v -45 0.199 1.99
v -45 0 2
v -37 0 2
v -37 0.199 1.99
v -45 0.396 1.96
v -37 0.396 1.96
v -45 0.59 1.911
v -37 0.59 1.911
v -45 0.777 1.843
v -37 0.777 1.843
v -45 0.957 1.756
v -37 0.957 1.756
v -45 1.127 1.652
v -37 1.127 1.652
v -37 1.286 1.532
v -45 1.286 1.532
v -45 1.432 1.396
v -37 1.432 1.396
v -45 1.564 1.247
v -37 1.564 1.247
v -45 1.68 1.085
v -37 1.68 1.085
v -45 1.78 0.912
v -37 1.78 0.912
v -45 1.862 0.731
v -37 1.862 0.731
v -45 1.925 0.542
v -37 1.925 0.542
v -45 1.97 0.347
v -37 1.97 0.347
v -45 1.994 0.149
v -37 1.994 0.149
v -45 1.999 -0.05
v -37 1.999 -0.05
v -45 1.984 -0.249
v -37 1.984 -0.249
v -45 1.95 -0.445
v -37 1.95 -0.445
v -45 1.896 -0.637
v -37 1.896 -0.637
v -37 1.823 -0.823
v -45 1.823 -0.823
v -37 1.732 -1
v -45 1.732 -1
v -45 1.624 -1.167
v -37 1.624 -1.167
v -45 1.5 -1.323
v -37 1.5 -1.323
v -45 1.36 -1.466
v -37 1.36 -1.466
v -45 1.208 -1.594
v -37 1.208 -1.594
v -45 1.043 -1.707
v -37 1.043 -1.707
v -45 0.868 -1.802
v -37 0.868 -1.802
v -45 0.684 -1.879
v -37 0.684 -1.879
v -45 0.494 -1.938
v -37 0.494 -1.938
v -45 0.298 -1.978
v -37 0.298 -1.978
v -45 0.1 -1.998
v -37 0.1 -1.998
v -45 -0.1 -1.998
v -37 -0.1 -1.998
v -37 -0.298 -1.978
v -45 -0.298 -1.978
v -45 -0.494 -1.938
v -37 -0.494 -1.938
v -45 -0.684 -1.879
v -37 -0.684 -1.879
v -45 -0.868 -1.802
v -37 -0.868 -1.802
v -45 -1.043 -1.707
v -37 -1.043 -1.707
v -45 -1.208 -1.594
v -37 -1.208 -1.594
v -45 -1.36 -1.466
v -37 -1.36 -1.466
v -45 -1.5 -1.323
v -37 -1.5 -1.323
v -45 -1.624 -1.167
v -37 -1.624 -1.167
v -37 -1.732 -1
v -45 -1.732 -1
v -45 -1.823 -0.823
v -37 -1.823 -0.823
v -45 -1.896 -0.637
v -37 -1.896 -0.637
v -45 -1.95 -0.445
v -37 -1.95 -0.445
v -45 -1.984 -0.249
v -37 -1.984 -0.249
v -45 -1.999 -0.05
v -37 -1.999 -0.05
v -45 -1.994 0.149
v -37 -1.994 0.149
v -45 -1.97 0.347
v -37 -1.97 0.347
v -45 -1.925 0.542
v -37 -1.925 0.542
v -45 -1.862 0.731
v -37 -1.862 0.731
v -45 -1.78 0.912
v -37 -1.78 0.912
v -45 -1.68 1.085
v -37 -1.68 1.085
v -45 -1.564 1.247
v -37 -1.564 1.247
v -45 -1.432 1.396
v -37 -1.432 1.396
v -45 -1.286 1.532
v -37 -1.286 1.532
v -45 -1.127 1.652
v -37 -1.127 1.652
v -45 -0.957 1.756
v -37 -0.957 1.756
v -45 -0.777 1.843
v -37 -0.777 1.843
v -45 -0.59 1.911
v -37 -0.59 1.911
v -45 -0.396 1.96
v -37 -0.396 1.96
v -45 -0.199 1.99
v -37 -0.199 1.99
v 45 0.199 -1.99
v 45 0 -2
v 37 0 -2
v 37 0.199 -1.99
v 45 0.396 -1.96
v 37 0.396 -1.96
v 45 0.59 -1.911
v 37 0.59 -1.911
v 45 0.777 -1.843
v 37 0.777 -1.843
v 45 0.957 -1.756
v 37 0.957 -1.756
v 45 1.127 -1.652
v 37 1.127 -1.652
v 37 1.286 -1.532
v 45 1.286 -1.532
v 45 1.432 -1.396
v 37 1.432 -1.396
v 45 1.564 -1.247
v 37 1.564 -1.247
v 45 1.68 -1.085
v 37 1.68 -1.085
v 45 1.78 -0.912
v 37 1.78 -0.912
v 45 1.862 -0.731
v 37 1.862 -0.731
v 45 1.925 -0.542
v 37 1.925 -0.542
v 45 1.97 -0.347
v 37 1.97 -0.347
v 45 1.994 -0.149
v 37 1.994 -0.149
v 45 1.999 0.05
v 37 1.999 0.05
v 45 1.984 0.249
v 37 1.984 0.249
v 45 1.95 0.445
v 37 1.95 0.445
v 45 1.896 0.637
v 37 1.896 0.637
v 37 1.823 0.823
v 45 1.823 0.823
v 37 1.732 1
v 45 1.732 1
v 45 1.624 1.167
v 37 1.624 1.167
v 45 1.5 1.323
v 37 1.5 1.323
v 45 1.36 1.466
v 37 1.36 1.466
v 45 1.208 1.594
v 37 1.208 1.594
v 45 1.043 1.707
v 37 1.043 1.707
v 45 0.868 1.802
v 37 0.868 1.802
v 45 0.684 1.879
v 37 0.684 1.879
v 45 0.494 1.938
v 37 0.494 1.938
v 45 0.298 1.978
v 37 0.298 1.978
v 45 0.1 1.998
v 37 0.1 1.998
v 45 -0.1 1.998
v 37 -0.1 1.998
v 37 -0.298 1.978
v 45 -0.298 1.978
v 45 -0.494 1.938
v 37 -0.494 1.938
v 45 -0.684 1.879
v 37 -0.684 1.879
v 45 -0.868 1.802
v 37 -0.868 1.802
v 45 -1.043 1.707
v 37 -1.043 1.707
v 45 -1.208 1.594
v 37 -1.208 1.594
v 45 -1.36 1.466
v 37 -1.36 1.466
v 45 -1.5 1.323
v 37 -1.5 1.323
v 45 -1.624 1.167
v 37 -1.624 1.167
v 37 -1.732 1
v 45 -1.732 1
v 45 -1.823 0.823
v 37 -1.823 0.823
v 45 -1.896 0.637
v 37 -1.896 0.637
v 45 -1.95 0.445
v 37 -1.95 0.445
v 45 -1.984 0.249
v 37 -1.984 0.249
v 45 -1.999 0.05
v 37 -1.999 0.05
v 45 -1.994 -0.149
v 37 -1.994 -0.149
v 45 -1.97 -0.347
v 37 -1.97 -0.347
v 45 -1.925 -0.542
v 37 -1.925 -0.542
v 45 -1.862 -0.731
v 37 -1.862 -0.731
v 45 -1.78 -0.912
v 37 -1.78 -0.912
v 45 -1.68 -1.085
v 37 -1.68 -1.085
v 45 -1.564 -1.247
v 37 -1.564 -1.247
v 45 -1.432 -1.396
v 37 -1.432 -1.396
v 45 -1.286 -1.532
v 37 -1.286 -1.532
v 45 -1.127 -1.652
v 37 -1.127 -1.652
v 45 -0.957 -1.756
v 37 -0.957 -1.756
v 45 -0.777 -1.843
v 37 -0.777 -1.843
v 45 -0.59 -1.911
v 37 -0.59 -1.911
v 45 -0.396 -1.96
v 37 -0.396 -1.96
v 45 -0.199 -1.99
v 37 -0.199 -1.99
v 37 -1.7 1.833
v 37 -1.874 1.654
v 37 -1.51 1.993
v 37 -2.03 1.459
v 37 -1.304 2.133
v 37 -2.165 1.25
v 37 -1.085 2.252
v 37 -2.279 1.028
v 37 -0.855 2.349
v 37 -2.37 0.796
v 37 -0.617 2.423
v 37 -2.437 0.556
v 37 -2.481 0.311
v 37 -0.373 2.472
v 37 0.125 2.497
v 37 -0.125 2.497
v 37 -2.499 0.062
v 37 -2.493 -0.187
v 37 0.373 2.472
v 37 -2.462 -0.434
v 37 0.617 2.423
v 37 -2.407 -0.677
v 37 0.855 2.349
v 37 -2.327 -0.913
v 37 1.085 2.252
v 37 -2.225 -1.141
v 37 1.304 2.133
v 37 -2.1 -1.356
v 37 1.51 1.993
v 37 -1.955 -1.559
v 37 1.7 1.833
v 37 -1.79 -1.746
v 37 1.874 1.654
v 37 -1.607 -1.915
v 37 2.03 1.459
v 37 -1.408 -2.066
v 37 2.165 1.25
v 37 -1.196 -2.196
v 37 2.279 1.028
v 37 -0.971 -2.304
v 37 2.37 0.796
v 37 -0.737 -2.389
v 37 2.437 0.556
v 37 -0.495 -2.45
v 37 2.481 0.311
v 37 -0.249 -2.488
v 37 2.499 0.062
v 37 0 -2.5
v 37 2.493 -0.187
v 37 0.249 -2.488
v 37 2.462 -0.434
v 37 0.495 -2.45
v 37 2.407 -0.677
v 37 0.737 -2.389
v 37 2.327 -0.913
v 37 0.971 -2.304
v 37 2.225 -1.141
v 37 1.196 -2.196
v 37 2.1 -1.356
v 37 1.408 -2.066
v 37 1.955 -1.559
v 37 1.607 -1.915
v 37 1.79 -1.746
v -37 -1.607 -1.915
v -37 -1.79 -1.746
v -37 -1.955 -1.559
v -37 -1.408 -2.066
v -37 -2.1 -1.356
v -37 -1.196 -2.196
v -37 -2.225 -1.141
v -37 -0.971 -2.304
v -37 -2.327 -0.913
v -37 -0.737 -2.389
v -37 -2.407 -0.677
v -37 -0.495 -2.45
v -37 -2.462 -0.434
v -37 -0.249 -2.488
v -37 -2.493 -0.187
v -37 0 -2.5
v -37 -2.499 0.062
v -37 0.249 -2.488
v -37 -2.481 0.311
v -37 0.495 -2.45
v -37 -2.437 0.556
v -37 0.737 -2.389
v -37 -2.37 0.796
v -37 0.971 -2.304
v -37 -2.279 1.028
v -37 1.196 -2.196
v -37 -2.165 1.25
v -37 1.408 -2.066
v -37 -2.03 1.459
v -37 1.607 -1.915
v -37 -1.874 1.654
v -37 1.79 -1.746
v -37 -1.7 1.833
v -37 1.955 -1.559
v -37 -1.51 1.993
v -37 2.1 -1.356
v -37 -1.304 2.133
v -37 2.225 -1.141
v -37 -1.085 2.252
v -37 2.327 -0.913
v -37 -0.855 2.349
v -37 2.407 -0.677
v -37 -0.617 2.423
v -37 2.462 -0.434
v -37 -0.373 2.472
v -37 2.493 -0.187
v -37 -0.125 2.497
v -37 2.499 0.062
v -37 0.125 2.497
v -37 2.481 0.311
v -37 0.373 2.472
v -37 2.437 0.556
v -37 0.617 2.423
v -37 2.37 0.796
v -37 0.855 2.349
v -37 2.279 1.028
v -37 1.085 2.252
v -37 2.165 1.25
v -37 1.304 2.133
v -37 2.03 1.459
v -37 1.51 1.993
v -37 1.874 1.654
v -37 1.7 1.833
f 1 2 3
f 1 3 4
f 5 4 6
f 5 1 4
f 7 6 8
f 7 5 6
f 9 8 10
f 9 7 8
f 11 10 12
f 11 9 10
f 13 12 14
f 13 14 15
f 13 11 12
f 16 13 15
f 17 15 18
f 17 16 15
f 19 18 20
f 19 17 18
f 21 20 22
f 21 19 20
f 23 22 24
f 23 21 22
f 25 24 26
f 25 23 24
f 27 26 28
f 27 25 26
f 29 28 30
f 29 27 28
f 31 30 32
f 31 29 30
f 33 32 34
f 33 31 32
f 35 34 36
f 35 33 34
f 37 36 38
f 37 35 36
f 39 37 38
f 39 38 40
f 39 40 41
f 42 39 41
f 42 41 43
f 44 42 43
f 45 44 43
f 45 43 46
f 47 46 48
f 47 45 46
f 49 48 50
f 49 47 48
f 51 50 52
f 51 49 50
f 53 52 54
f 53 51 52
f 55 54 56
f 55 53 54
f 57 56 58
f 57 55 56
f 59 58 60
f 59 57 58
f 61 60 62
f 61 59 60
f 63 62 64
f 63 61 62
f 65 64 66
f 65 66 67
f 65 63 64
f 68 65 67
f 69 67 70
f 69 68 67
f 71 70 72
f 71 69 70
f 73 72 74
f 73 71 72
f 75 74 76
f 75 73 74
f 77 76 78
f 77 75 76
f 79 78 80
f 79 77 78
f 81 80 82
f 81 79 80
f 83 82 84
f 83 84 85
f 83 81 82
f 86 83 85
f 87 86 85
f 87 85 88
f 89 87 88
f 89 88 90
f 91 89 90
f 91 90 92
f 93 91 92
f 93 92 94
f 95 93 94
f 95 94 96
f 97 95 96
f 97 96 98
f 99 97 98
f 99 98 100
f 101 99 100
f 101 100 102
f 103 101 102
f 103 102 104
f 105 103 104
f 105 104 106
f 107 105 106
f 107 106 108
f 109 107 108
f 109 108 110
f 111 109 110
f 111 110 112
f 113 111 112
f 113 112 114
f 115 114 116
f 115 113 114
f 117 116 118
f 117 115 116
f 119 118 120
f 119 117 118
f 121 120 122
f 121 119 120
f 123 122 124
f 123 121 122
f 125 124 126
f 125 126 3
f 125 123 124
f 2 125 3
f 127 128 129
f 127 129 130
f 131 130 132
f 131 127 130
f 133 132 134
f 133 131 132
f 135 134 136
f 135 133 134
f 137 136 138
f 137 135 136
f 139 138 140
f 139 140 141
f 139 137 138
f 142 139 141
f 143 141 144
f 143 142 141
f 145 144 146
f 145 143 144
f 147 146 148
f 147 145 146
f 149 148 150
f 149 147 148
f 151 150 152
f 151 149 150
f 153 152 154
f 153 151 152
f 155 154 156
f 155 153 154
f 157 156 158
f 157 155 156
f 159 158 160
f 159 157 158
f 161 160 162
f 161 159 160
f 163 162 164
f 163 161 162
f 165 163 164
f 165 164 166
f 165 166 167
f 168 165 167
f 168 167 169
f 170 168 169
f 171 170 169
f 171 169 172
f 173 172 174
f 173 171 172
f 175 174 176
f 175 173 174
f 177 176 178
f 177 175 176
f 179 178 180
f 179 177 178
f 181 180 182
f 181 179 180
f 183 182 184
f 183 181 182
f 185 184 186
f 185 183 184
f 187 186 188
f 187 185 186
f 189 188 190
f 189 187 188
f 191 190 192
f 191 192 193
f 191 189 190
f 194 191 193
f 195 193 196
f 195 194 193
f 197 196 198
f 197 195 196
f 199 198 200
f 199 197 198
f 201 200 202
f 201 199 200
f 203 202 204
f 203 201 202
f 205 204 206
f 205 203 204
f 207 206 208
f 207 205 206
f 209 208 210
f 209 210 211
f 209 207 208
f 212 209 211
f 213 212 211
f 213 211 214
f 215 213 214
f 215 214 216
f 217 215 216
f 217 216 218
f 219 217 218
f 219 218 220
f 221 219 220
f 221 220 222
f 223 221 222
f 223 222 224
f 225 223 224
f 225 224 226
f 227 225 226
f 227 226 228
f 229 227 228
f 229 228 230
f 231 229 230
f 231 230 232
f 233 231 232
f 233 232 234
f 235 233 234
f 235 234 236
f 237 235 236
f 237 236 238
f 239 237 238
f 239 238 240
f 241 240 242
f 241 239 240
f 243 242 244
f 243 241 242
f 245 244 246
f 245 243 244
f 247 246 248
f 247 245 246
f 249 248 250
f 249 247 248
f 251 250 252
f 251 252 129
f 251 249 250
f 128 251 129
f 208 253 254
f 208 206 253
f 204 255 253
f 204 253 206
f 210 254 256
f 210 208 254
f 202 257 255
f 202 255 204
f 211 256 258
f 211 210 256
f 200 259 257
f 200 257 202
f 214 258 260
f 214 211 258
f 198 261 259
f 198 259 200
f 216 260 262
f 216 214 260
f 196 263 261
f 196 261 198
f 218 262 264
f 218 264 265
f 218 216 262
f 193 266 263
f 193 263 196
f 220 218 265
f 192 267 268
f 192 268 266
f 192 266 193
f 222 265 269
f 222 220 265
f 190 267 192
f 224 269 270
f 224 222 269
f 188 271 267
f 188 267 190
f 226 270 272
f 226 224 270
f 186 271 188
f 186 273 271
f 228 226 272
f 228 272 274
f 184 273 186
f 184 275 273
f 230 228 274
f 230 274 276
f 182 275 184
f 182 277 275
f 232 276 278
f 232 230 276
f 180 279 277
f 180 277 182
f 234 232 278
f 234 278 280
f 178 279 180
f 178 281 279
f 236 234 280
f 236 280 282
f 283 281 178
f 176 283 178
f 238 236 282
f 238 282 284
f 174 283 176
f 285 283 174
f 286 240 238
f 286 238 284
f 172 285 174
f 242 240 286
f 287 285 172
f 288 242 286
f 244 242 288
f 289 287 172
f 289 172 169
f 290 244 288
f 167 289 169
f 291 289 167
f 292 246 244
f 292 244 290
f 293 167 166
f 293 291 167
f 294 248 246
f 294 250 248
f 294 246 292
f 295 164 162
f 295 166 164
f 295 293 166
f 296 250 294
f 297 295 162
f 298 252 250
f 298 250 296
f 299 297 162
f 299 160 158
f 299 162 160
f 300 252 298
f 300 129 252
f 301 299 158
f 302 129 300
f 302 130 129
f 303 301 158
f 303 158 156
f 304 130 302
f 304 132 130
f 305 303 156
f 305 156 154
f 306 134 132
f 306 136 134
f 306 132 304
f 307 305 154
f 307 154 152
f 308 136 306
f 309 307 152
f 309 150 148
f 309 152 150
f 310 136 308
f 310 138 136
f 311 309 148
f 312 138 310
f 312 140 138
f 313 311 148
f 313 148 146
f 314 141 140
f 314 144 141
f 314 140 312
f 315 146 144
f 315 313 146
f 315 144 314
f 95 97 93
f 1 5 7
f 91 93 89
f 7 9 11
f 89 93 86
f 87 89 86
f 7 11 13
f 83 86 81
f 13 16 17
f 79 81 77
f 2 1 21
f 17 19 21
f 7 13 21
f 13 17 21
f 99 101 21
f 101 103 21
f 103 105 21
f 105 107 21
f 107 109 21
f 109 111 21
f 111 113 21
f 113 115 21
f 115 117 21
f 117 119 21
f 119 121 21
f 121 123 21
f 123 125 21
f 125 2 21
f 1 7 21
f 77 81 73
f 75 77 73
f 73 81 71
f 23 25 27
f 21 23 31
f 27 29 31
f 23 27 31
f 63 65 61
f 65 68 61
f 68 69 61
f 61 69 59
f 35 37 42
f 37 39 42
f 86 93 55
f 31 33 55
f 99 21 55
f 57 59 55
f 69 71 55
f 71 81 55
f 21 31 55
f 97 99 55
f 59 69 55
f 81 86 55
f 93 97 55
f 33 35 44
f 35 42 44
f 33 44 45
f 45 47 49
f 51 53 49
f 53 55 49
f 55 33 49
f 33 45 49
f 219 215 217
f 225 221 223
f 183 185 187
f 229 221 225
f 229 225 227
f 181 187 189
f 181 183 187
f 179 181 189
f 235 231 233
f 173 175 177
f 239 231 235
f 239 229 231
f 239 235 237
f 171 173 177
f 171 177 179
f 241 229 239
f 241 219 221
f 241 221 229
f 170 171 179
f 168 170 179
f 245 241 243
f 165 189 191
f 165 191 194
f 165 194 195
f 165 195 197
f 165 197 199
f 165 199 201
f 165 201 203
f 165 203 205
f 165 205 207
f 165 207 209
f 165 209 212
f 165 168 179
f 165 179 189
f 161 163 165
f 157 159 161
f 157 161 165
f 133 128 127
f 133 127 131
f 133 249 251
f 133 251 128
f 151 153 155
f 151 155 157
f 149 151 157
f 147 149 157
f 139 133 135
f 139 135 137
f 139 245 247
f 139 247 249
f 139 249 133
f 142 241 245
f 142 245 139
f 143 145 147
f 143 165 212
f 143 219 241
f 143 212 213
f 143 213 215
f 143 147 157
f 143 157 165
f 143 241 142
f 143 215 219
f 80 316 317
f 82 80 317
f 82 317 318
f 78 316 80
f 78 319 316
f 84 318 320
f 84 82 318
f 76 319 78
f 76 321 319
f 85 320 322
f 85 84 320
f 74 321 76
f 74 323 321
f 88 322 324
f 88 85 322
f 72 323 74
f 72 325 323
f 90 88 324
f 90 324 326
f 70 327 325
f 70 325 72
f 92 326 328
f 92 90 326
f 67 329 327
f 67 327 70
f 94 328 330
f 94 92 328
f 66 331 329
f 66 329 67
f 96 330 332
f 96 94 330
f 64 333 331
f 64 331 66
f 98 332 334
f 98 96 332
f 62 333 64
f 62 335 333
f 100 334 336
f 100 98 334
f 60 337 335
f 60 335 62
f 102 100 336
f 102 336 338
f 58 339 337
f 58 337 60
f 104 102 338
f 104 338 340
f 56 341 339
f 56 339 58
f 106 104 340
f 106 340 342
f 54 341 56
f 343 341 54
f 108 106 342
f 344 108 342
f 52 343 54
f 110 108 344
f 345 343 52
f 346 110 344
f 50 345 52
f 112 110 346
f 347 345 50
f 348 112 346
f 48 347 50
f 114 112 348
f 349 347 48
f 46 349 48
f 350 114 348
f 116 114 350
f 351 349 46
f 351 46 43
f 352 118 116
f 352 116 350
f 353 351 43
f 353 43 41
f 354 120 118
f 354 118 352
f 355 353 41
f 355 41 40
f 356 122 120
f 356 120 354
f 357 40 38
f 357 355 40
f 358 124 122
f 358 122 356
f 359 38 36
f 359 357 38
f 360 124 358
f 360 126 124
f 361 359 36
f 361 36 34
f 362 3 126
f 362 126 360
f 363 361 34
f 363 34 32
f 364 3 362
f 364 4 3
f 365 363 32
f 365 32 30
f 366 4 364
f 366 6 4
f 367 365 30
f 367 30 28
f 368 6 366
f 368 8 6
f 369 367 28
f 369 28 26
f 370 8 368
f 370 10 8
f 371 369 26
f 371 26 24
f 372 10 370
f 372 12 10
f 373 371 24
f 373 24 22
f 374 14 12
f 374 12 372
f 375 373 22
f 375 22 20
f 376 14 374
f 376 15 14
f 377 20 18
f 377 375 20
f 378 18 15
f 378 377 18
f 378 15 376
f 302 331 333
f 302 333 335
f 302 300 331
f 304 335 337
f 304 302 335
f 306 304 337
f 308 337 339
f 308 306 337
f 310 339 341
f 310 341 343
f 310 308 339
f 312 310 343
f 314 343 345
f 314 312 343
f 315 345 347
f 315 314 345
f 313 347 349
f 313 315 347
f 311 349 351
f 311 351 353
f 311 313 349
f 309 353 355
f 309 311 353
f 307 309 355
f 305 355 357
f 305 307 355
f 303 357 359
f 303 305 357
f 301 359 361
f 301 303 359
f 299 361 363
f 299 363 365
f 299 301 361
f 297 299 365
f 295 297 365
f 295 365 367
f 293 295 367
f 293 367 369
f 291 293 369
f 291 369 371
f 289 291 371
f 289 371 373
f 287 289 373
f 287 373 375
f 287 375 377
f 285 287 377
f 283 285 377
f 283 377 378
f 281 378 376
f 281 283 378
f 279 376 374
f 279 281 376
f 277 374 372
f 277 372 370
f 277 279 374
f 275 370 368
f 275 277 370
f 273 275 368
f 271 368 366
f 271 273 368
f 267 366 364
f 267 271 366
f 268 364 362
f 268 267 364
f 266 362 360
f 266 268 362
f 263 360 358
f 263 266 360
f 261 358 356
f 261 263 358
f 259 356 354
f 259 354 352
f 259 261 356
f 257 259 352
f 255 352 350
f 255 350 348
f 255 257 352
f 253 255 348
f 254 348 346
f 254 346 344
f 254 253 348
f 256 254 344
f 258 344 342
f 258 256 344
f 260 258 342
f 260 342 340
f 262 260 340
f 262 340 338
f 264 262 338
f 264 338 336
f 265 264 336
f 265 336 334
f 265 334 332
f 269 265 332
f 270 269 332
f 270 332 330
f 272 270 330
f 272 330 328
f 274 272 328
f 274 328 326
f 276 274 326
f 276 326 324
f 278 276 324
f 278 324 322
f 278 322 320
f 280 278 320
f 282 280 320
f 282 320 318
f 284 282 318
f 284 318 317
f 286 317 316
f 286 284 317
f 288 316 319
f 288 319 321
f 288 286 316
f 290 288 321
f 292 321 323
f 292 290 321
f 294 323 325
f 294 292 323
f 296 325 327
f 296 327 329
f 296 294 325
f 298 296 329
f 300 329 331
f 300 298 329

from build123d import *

# Parameters (mm, degrees)
SKETCH1_R           = 2.5
BOSS_EXTRUDE1_DEPTH = 45
SKETCH2_R           = 2.5
SKETCH2_R_2         = 2
CUT_EXTRUDE1_DEPTH  = 8
SKETCH3_R           = 2.5
SKETCH3_R_2         = 2
CUT_EXTRUDE2_DEPTH  = 8


with BuildPart() as part:
    # Sketch1 → Boss-Extrude1 (new body, symmetric)
    with BuildSketch(Plane(origin=(0, 0, 0), x_dir=(0, 0, -1), z_dir=(1, 0, 0))):
        Circle(SKETCH1_R)
    extrude(amount=BOSS_EXTRUDE1_DEPTH, both=True)

    # Sketch2 → Cut-Extrude1 (cut)
    with BuildSketch(Plane(origin=(45, 0, 0), x_dir=(0, 0, -1), z_dir=(1, 0, 0))):
        Circle(SKETCH2_R)
        Circle(SKETCH2_R_2, mode=Mode.SUBTRACT)
    extrude(amount=-CUT_EXTRUDE1_DEPTH, mode=Mode.SUBTRACT)

    # Sketch3 → Cut-Extrude2 (cut)
    with BuildSketch(Plane.ZY.offset(45)):
        Circle(SKETCH3_R)
        Circle(SKETCH3_R_2, mode=Mode.SUBTRACT)
    extrude(amount=-CUT_EXTRUDE2_DEPTH, mode=Mode.SUBTRACT)


solid = part.part
